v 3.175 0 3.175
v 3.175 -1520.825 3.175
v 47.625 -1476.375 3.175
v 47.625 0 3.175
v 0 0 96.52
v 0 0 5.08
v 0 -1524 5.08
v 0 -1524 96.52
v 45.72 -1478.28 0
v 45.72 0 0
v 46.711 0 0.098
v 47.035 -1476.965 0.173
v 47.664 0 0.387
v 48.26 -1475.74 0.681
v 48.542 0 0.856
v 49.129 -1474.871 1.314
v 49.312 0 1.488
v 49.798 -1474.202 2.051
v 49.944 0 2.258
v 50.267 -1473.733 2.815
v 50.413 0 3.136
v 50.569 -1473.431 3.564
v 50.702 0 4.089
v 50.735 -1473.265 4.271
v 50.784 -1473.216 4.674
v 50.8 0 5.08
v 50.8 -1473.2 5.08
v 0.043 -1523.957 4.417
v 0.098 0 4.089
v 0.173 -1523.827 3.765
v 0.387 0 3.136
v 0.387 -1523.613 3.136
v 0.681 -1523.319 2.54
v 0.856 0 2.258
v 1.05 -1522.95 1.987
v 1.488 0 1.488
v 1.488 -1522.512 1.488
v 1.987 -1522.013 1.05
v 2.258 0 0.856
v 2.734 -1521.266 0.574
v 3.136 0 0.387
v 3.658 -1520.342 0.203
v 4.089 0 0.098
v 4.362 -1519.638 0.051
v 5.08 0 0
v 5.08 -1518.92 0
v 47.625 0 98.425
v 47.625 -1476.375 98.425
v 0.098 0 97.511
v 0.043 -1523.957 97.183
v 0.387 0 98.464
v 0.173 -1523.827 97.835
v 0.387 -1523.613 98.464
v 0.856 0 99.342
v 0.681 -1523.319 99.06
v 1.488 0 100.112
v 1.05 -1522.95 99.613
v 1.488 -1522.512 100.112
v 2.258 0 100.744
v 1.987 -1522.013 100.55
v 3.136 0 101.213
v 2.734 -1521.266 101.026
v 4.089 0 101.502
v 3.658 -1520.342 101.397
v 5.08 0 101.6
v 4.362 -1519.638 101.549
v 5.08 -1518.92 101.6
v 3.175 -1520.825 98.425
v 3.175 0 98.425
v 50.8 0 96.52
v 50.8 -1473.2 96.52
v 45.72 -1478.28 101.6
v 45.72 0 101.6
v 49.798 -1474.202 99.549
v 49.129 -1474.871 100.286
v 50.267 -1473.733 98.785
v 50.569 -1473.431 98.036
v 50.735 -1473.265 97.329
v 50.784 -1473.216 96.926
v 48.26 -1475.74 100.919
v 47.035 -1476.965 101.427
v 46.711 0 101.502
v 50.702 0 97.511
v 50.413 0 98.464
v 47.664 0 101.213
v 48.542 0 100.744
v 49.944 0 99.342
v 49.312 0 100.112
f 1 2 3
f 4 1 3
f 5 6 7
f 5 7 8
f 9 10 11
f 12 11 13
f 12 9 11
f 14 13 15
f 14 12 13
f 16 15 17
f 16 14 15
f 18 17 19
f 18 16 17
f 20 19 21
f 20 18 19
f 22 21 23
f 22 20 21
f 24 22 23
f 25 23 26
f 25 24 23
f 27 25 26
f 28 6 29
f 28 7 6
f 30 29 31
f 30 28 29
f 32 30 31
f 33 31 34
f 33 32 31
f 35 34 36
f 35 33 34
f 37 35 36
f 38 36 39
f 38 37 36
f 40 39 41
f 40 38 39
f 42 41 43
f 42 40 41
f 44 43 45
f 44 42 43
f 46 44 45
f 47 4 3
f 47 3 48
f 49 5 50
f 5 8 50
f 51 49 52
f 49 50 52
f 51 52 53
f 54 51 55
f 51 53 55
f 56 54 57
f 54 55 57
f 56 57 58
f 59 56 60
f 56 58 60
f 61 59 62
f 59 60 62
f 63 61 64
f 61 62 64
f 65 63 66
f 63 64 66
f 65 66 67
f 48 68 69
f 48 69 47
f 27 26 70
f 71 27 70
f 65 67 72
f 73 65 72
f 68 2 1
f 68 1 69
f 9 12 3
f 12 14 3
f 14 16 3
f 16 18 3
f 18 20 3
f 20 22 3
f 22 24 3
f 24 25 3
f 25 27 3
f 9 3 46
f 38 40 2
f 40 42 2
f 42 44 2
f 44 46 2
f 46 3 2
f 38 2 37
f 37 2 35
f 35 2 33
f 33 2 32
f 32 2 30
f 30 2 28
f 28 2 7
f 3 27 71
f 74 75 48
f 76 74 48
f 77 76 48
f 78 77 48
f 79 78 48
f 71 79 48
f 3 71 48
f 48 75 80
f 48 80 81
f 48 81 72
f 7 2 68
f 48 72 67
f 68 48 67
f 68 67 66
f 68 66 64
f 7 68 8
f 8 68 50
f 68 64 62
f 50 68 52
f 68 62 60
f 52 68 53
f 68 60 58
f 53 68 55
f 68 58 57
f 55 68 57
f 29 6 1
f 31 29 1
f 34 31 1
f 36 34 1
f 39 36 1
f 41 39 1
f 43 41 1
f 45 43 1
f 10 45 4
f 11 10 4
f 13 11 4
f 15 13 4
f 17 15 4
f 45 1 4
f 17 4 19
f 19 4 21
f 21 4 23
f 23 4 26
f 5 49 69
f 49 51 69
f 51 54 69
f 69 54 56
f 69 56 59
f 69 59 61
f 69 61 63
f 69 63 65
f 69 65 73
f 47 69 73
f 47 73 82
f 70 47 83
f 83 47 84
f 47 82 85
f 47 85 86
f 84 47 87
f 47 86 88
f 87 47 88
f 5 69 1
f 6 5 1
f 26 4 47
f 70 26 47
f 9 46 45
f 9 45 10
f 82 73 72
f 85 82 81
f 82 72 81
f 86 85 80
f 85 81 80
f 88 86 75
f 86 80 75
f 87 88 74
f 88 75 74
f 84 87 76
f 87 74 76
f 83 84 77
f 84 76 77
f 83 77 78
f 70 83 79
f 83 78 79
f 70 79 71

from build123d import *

# Parameters (mm, degrees)
F0_W     = 50.8
F0_H     = 101.6
F0_W_2   = 44.45
F0_H_2   = 95.25
F1_DEPTH = 1524
F3_DEPTH = 173.228
F4_R     = 5.08


# Not quite as in the source:
# - a feature names something its author has since deleted; it is built from what else it names


with BuildPart() as f1:
    # F0 (on Front) → F1 (new body)
    with BuildSketch(Plane.XZ):
        with Locations((25.4, 50.8)):
            Rectangle(F0_W, F0_H)
        with Locations((25.4, 50.8)):
            Rectangle(F0_W_2, F0_H_2, mode=Mode.SUBTRACT)
    extrude(amount=F1_DEPTH)

    # F2 (on face) → F3 (cut)
    with BuildSketch(Plane.XY.offset(101.6)):
        Polygon((50.8, -1473.2), (0, -1524), (50.8, -1524), align=None)
    extrude(amount=-F3_DEPTH, mode=Mode.SUBTRACT)

    # F4
    f4_edges = [f1.edges().sort_by_distance(p)[0] for p in [
        (0, -762, 0),
        (50.8, -736.6, 0),
        (50.8, -736.6, 101.6),
        (0, -762, 101.6),
    ]]
    fillet(f4_edges, radius=F4_R)


solid = f1.part
